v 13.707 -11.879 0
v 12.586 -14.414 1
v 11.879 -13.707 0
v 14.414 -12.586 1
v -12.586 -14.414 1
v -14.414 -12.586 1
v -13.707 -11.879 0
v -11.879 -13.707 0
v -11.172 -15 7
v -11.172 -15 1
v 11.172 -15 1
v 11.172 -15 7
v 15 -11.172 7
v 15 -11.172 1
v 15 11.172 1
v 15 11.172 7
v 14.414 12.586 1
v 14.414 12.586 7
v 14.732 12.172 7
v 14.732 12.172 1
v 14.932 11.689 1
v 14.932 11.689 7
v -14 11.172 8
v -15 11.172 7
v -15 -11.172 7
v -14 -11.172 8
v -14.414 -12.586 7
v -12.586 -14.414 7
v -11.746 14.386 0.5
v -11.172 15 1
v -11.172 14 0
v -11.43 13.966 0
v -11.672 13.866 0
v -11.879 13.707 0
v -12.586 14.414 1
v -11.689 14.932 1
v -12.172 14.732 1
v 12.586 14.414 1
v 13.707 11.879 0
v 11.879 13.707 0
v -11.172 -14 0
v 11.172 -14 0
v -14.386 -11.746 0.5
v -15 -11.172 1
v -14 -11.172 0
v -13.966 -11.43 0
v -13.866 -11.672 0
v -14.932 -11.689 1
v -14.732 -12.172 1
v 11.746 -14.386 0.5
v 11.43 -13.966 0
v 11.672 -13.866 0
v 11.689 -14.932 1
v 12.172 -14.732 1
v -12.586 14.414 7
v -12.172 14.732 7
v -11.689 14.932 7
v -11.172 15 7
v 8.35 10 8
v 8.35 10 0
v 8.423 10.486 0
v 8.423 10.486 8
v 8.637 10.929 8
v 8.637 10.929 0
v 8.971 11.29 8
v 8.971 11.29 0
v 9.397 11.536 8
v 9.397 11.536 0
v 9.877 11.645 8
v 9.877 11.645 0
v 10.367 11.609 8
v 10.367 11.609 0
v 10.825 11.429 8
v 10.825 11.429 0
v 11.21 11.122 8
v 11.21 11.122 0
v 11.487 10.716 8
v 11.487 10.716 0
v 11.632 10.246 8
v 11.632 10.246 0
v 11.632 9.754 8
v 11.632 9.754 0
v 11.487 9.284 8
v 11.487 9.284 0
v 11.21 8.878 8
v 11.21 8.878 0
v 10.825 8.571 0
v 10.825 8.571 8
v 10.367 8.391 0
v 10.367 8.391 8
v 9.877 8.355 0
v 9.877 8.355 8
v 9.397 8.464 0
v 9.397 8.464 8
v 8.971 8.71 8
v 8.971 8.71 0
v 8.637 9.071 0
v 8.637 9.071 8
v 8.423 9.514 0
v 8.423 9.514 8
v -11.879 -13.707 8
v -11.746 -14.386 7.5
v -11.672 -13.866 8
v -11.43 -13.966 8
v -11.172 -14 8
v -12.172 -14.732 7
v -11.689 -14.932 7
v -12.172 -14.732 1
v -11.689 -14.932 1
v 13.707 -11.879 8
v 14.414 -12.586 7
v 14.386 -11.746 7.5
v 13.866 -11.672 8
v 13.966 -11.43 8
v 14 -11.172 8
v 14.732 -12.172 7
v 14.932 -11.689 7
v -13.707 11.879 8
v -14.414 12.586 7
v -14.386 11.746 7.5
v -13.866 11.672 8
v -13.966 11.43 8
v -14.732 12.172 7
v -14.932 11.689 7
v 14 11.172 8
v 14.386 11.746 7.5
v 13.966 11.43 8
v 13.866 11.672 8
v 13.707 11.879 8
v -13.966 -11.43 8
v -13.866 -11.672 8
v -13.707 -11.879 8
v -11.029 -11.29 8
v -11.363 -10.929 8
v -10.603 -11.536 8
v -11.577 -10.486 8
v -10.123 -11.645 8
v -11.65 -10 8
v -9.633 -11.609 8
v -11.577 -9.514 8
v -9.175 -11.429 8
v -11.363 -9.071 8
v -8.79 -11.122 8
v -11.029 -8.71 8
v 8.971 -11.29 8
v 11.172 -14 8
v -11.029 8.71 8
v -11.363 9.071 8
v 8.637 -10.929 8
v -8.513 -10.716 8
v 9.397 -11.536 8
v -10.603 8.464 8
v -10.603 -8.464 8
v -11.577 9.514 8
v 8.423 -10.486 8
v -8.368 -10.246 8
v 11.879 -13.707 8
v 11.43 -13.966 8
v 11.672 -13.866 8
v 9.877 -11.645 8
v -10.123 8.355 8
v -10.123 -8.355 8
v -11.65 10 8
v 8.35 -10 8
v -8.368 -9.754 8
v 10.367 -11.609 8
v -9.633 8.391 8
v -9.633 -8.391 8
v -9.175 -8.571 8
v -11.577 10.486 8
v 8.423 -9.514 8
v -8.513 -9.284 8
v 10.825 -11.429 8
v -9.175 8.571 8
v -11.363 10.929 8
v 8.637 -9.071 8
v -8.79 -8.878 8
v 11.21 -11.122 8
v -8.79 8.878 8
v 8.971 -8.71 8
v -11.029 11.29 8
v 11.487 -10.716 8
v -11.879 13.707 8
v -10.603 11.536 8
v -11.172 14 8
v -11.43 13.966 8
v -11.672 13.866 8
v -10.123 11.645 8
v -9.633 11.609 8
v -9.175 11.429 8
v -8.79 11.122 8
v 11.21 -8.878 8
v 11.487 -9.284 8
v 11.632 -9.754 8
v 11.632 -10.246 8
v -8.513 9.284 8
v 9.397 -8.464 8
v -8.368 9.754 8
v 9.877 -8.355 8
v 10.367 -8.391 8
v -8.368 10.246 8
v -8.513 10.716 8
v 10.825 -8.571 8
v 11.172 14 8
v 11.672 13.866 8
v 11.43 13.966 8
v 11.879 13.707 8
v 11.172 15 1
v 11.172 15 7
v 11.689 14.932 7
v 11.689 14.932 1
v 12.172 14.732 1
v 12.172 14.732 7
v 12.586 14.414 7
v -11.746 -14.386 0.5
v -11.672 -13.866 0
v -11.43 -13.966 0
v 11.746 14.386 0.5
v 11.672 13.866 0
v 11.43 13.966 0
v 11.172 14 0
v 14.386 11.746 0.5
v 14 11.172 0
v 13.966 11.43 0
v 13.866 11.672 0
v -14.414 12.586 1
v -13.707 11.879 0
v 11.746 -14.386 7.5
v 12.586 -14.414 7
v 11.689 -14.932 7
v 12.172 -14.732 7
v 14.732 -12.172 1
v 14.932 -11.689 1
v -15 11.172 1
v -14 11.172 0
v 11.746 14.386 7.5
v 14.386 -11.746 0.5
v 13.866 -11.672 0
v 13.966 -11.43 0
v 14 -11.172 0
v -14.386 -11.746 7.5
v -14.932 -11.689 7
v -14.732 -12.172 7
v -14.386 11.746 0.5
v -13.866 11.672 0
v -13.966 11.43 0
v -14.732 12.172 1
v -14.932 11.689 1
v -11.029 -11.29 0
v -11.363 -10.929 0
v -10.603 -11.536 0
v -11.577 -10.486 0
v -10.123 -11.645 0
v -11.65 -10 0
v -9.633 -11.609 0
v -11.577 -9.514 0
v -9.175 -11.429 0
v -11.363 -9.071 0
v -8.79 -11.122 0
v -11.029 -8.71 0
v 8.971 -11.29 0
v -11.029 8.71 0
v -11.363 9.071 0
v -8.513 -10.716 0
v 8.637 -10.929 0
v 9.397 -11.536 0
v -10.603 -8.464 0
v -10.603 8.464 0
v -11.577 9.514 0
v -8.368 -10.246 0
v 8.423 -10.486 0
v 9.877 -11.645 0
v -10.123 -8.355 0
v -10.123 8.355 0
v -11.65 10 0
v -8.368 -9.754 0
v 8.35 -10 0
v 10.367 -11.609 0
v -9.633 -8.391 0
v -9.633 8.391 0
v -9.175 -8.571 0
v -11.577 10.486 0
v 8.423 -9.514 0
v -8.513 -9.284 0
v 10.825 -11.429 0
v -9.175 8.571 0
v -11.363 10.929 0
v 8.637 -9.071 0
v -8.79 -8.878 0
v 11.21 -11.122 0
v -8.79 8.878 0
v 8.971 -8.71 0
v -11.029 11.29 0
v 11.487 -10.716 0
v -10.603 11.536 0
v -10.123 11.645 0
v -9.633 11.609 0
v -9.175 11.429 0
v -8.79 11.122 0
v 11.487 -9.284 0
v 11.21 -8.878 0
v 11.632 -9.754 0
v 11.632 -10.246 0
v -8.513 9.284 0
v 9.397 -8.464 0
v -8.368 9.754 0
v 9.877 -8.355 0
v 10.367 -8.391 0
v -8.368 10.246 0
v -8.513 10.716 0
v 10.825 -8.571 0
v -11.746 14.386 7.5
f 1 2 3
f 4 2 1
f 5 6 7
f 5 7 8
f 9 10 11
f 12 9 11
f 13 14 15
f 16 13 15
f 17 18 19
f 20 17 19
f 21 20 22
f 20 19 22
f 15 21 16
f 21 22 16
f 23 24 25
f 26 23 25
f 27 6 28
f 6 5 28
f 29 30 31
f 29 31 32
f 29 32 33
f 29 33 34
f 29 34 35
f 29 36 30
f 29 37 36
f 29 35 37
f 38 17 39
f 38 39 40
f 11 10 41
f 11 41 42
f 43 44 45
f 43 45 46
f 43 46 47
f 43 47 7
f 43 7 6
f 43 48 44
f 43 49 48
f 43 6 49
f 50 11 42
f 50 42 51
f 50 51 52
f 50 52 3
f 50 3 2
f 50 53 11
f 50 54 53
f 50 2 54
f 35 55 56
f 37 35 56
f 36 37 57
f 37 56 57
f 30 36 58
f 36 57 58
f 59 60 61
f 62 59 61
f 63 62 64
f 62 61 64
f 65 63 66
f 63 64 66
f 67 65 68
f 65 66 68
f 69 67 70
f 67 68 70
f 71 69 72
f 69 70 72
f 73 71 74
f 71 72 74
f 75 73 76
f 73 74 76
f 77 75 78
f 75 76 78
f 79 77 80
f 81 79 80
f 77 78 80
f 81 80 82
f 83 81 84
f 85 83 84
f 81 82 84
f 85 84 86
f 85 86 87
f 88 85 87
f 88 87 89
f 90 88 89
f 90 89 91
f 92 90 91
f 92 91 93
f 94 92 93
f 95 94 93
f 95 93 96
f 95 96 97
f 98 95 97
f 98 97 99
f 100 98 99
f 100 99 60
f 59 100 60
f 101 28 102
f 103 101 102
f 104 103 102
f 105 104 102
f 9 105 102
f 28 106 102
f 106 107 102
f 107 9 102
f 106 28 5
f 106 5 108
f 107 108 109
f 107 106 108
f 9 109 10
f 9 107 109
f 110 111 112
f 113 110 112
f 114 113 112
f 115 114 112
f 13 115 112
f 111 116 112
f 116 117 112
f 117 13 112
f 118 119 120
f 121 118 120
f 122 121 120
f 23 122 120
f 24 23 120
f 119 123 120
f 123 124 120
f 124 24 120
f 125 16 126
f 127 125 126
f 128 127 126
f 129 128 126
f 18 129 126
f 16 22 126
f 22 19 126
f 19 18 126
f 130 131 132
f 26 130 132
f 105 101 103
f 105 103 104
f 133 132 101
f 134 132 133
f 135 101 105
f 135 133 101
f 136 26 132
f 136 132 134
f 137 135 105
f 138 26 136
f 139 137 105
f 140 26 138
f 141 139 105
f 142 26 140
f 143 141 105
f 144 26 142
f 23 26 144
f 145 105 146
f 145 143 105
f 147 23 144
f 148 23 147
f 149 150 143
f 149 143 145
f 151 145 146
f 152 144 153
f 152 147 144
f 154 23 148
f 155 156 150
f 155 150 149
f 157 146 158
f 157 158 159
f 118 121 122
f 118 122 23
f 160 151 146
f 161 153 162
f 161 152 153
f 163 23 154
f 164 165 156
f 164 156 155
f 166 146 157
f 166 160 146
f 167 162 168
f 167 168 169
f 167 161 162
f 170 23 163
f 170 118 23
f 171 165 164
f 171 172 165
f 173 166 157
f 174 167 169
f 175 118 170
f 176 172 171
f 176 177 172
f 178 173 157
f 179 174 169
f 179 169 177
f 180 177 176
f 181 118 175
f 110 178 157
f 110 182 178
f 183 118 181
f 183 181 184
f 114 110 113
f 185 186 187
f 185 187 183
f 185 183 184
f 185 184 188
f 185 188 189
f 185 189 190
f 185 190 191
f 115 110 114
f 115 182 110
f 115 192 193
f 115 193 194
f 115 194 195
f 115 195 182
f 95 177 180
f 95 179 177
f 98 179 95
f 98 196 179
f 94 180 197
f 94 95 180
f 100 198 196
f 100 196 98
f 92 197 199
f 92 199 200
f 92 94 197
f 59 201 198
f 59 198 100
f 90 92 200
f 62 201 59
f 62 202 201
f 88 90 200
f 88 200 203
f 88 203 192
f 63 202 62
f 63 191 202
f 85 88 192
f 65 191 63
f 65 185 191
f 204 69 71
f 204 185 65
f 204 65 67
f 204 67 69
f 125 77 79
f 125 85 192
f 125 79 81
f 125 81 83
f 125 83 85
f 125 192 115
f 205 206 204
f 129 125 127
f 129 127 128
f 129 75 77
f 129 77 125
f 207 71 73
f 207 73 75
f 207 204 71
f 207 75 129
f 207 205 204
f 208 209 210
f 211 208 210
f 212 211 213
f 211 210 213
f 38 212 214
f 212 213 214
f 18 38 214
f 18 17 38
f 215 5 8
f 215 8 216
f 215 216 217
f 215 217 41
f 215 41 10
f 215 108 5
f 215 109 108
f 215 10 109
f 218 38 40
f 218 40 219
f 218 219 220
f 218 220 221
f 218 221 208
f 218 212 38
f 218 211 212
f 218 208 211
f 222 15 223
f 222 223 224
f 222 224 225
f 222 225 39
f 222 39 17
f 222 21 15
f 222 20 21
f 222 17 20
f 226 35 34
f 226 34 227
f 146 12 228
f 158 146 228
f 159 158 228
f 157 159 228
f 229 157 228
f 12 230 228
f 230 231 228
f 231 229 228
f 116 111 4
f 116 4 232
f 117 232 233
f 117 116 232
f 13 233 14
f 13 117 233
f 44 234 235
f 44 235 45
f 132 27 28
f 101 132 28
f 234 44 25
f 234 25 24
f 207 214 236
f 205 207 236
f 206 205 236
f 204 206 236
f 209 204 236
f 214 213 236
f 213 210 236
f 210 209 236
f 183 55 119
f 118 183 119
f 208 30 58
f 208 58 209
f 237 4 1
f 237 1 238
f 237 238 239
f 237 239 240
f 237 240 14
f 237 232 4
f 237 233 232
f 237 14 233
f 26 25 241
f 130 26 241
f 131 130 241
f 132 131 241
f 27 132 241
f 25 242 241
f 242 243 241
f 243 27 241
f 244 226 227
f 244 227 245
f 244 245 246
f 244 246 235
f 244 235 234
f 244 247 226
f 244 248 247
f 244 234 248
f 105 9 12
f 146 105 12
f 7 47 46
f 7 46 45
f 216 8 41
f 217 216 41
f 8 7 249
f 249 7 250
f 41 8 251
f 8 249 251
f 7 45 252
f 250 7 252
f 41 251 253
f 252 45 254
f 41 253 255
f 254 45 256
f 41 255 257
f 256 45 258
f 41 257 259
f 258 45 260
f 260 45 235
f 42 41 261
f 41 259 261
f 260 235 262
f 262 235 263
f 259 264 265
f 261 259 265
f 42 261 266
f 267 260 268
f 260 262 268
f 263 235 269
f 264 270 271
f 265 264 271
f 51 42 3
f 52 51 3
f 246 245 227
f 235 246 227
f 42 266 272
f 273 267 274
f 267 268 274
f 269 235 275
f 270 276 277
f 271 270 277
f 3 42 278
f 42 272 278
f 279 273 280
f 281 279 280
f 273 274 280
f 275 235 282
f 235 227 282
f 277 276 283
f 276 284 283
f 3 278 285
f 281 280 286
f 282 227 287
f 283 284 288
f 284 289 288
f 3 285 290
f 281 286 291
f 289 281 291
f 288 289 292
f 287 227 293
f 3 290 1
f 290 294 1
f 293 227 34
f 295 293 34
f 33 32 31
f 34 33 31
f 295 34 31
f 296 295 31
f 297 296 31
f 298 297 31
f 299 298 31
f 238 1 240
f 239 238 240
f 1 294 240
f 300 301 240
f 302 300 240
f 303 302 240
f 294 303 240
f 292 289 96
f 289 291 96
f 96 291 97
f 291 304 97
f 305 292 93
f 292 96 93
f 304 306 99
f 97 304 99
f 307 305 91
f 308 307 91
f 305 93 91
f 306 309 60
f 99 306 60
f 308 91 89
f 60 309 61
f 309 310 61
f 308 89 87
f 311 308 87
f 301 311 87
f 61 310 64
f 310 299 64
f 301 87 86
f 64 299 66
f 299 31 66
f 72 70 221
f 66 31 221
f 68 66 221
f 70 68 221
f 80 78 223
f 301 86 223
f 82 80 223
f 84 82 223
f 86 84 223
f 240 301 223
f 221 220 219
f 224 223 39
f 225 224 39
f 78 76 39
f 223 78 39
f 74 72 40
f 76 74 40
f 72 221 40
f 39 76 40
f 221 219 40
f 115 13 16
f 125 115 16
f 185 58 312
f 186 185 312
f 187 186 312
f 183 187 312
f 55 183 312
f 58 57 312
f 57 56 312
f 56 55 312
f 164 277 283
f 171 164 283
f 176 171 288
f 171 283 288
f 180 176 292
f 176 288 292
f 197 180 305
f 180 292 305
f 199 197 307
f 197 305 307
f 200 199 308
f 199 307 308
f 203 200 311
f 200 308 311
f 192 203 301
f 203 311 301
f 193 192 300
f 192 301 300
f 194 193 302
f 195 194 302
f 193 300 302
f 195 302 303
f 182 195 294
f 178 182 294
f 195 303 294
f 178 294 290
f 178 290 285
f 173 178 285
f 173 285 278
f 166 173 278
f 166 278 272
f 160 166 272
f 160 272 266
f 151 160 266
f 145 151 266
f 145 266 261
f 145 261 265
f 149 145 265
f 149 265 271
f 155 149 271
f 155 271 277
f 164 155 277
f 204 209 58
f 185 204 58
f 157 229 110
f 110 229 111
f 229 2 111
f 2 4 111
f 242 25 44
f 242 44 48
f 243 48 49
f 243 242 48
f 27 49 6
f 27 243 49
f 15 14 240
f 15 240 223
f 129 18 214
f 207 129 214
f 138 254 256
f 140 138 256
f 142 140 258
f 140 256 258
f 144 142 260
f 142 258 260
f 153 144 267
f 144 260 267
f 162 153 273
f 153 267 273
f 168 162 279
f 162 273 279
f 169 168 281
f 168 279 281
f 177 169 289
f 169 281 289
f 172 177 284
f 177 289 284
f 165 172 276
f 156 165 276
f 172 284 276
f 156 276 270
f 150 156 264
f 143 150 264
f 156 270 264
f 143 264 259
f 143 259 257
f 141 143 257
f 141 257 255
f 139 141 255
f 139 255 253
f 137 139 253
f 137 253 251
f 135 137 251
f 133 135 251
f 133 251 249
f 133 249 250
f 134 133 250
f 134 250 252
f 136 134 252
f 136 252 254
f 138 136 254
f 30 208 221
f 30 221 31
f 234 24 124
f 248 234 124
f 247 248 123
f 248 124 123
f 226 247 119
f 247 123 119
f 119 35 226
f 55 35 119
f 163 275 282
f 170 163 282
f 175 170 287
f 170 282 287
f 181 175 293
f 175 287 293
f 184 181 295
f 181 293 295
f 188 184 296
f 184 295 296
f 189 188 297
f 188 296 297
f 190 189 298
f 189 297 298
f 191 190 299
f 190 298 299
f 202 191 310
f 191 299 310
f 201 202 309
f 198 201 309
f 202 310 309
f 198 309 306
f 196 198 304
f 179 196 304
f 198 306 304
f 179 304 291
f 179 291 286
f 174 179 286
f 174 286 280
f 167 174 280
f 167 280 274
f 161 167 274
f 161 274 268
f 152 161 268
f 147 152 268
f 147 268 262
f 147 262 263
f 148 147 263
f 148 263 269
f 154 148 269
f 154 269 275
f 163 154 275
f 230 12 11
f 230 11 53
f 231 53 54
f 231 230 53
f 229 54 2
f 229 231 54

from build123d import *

# Parameters (mm, degrees)
SKETCH_1_W         = 30
SKETCH_1_H         = 30
EXTRUDE_1_DEPTH    = 8
HOLE_WIZARD_M4_1_D = 3.3
CHAMFER_1_SIZE     = 3
FILLET_1_R         = 2
CHAMFER_2_SIZE     = 1


with BuildPart() as part:
    # ｽｹｯﾁ1 → ﾎﾞｽ - 押し出し1 (new body)
    with BuildSketch(Plane.XY):
        Rectangle(SKETCH_1_W, SKETCH_1_H)
    extrude(amount=EXTRUDE_1_DEPTH)

    # M4 すきま穴1 (through all)
    with Locations(Plane.XY.offset(8)):
        with Locations((-10, 10), (-10, -10), (10, -10), (10, 10)):
            Hole(HOLE_WIZARD_M4_1_D / 2)

    # 面取り1
    chamfer_1_edges = [part.edges().sort_by_distance(p)[0] for p in [
        (-15, 15, 4),
        (15, 15, 4),
        (15, -15, 4),
        (-15, -15, 4),
    ]]
    chamfer(chamfer_1_edges, length=CHAMFER_1_SIZE)

    # ﾌｨﾚｯﾄ1
    fillet_1_edges = [part.edges().sort_by_distance(p)[0] for p in [
        (-12, 15, 4),
        (12, 15, 4),
        (15, -12, 4),
        (15, 12, 4),
        (-15, -12, 4),
        (-15, 12, 4),
        (-12, -15, 4),
        (12, -15, 4),
    ]]
    fillet(fillet_1_edges, radius=FILLET_1_R)

    # 面取り2
    chamfer_2_edges = [part.edges().sort_by_distance(p)[0] for p in [
        (15, 0, 0),
        (15, 0, 8),
        (13.5, 13.5, 8),
        (0, 15, 8),
        (-13.5, 13.5, 8),
        (-15, 0, 8),
        (-13.5, -13.5, 8),
        (0, -15, 8),
        (13.5, -13.5, 8),
        (11.93693974, -14.847759065, 8),
        (14.847759065, -11.93693974, 8),
        (-11.93693974, -14.847759065, 8),
        (-14.847759065, -11.93693974, 8),
        (-14.847759065, 11.93693974, 8),
        (-11.93693974, 14.847759065, 8),
        (11.93693974, 14.847759065, 8),
        (14.847759065, 11.93693974, 8),
        (13.5, 13.5, 0),
        (0, 15, 0),
        (13.5, -13.5, 0),
        (0, -15, 0),
        (-13.5, -13.5, 0),
        (-15, 0, 0),
        (-13.5, 13.5, 0),
        (11.93693974, -14.847759065, 0),
        (14.847759065, -11.93693974, 0),
        (-11.93693974, -14.847759065, 0),
        (-14.847759065, -11.93693974, 0),
        (-14.847759065, 11.93693974, 0),
        (-11.93693974, 14.847759065, 0),
        (11.93693974, 14.847759065, 0),
        (14.847759065, 11.93693974, 0),
    ]]
    chamfer(chamfer_2_edges, length=CHAMFER_2_SIZE)


solid = part.part
